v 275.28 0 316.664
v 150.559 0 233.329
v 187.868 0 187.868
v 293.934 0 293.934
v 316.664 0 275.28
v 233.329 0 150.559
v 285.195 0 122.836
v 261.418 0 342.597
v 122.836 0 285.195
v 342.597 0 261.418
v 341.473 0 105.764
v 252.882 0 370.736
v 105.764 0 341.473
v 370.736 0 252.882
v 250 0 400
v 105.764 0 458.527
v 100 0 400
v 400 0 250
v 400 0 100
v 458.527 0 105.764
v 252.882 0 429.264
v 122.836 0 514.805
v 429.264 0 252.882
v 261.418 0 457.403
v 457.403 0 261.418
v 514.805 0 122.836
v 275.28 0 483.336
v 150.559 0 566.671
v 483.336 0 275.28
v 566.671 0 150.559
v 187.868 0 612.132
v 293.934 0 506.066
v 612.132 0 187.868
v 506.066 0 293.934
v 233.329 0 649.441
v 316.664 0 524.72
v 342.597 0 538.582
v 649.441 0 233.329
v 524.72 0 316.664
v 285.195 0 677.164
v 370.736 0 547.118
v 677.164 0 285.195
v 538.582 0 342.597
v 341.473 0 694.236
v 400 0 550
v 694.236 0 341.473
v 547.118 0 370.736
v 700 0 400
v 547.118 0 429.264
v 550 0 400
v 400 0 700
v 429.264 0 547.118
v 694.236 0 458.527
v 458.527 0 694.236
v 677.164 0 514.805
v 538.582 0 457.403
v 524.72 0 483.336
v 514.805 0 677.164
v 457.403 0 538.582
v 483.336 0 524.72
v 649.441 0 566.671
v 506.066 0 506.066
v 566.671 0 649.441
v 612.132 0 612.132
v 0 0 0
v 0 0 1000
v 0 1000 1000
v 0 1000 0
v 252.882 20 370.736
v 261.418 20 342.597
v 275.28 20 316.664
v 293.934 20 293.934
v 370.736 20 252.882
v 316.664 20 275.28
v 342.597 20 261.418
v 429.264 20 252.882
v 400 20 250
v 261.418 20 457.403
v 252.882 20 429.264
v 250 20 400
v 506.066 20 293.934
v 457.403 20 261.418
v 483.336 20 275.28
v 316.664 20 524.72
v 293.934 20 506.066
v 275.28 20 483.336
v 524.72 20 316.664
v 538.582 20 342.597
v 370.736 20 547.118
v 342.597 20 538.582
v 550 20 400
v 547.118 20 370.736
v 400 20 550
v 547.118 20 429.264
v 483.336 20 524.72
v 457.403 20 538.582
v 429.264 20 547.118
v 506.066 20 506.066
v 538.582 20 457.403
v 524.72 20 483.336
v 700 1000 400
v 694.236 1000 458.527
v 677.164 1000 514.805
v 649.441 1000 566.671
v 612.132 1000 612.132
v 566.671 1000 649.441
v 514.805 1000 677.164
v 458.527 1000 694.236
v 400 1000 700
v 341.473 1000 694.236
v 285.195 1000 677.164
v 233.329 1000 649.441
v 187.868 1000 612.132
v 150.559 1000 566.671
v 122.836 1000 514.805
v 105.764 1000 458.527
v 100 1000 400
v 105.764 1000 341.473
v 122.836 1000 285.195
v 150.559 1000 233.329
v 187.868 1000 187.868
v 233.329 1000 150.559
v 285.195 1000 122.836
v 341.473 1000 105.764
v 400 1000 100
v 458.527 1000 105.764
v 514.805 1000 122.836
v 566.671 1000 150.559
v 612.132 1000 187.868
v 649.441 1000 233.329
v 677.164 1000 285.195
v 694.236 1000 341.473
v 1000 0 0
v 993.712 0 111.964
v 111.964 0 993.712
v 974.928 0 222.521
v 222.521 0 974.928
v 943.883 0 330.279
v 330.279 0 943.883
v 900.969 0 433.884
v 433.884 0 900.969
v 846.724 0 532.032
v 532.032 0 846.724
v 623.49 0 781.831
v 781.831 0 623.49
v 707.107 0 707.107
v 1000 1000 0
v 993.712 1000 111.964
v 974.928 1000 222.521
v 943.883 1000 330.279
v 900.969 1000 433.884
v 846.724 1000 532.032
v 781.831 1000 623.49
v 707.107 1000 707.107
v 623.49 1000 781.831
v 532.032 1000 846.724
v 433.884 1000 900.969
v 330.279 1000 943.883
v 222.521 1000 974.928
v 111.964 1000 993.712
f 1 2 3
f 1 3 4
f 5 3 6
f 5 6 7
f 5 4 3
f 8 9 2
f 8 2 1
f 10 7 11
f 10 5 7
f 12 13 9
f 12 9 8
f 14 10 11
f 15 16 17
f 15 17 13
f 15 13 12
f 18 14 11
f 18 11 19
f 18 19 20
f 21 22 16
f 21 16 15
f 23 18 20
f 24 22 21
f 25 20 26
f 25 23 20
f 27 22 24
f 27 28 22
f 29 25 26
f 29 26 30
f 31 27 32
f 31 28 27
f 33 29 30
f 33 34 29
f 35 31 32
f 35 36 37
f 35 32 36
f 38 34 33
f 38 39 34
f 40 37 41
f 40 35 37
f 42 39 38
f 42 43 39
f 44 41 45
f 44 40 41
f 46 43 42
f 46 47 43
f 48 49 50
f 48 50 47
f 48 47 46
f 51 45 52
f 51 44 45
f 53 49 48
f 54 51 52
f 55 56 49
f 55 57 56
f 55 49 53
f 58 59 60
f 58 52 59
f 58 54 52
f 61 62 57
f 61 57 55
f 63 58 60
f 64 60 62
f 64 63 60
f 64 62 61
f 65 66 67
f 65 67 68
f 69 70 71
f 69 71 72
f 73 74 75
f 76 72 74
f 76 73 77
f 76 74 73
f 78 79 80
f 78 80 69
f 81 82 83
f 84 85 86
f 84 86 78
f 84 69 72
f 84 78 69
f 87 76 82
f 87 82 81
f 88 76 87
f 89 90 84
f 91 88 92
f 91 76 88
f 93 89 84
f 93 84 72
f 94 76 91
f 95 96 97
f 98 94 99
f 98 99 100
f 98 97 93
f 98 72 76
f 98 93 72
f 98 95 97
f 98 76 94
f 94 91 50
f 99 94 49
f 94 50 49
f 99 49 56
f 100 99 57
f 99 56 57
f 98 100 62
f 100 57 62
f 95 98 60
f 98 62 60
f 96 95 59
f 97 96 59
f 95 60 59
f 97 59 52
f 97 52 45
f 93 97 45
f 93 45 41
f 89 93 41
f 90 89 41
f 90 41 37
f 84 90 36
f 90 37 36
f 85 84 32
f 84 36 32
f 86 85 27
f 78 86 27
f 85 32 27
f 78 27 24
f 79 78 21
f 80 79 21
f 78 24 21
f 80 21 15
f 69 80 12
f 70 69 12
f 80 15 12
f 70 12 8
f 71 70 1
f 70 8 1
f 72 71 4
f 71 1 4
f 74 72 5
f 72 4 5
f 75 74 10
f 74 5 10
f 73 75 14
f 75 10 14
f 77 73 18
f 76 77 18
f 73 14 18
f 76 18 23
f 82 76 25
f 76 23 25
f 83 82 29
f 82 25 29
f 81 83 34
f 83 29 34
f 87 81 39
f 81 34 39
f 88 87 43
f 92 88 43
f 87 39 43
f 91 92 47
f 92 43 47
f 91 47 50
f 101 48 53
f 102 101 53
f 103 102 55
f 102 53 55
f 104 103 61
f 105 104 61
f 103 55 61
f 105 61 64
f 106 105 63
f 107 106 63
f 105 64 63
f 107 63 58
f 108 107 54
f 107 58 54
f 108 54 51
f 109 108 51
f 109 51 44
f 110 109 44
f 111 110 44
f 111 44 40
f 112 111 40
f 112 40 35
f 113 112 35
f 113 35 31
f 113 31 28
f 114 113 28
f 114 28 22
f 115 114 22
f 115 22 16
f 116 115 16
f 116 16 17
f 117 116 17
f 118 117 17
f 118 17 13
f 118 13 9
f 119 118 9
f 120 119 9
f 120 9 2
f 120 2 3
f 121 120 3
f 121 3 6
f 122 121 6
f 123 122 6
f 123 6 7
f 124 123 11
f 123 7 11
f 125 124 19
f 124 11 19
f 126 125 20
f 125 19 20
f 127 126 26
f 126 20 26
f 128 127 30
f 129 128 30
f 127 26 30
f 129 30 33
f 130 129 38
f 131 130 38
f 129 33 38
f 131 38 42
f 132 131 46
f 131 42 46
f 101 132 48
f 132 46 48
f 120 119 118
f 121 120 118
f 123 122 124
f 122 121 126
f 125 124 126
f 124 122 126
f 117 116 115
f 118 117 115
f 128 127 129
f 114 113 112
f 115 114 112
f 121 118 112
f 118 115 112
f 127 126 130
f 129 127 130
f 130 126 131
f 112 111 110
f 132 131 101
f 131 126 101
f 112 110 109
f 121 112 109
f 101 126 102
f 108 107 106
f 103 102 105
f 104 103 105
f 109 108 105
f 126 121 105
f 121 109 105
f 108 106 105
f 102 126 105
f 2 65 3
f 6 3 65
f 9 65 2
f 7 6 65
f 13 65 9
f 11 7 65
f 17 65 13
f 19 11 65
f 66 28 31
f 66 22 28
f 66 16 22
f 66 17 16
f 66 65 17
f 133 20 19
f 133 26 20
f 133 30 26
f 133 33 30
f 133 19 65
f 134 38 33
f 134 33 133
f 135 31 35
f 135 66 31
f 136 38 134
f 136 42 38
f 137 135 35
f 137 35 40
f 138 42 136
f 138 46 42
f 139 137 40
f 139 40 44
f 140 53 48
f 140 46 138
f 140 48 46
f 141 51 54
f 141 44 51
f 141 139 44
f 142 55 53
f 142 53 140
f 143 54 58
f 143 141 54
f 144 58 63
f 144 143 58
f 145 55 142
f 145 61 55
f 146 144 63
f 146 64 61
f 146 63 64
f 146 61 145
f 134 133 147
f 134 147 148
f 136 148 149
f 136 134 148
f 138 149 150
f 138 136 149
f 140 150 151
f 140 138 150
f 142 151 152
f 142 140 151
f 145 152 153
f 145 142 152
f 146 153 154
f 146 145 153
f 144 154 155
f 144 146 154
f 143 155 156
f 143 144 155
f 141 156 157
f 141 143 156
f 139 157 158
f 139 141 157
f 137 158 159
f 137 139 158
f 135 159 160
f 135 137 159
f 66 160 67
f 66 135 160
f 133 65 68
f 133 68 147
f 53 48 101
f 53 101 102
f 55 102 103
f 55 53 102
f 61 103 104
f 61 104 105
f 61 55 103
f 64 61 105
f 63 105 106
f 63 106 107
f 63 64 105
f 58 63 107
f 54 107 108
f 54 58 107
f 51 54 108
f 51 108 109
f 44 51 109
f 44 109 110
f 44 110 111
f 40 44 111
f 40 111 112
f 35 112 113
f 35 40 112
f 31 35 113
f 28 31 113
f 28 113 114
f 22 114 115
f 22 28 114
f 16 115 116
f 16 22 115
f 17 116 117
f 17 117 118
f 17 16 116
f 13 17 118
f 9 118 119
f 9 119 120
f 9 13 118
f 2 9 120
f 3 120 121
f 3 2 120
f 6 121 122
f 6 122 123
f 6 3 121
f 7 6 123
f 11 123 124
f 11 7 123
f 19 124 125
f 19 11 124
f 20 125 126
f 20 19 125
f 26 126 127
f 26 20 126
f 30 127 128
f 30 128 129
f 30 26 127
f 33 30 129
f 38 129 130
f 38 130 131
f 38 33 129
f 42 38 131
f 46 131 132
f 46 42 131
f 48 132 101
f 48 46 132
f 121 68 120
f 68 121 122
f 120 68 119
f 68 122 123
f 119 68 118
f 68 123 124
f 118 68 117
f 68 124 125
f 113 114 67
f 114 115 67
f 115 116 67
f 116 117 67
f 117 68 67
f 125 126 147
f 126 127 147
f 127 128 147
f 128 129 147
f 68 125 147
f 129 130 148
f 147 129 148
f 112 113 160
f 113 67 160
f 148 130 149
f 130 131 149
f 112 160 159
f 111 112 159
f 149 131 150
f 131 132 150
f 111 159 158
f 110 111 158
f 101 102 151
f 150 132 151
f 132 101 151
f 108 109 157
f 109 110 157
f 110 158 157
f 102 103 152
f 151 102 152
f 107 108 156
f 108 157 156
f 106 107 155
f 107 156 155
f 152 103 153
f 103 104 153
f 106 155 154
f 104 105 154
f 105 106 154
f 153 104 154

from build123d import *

# Parameters (mm, degrees)
F3_DEPTH = 1000
F2_R     = 300
F4_DEPTH = 1200
F5_DEPTH = 1000
F1_R     = 150
F6_DEPTH = 20


with BuildPart() as f3:
    # F0 (on Front) → F3 (new body)
    with BuildSketch(Plane.XZ):
        with BuildLine():
            Line((0, 0), (1000, 0))
            ThreePointArc((1000, 0), (707.106781, 707.106781), (0, 1000))
            Line((0, 1000), (0, 0))
        make_face()
    extrude(amount=-F3_DEPTH)

    # F2 (on Front) → F4 (cut)
    with BuildSketch(Plane.XZ):
        with Locations((400, 400)):
            Circle(F2_R)
    extrude(amount=-F4_DEPTH, mode=Mode.SUBTRACT)


with BuildPart() as f5:
    # F2 (on Front) → F5 (new body, through all)
    with BuildSketch(Plane.XZ):
        with Locations((400, 400)):
            Circle(F2_R)
    extrude(amount=-F5_DEPTH)

    # F1 (on Front) → F6 (cut)
    with BuildSketch(Plane.XZ):
        with Locations((400, 400)):
            Circle(F1_R)
    extrude(amount=-F6_DEPTH, mode=Mode.SUBTRACT)


solid = Compound([f3.part, f5.part])
